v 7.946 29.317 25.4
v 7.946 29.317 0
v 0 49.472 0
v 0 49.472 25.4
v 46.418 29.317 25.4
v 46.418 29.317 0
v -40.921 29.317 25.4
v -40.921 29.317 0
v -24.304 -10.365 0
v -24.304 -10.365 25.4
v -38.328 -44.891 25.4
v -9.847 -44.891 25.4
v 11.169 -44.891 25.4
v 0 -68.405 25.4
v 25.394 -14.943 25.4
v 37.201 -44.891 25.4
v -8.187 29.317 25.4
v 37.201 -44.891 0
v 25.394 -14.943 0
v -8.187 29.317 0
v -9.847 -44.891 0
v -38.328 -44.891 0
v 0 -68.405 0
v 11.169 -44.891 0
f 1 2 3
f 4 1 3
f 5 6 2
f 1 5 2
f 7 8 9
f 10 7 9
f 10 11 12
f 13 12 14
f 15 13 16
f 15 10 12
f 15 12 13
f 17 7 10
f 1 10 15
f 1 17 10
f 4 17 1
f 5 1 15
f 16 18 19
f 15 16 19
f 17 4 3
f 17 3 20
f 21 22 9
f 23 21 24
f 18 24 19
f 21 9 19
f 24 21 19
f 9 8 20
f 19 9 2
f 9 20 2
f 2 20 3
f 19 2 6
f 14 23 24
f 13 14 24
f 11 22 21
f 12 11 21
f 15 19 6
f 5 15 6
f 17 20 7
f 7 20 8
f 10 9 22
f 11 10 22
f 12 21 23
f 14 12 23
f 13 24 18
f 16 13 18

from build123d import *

# Parameters (mm, degrees)
F1_DEPTH = 25.4


with BuildPart() as f1:
    # F0 (on Top) → F1 (new body)
    with BuildSketch(Plane.XY):
        Polygon((-8.186579082, 29.3166413903), (-40.9211441875, 29.3166413903), (-24.3044075905, -10.3651176924), align=None)
        Polygon((0, 49.4718290865), (-8.186579082, 29.3166413903), (7.9457961573, 29.3166413903), align=None)
        Polygon((7.9457961573, 29.3166413903), (-8.186579082, 29.3166413903), (-24.3044075905, -10.3651176924), (-9.8466492379, -44.8911078274), (11.169333611, -44.8911078274), (25.3944805374, -14.9434304482), align=None)
        Polygon((-9.8466492379, -44.8911078274), (-24.3044075905, -10.3651176924), (-38.3280799513, -44.8911078274), align=None)
        Polygon((46.4180149138, 29.3166413903), (7.9457961573, 29.3166413903), (25.3944805374, -14.9434304482), align=None)
        Polygon((11.169333611, -44.8911078274), (-9.8466492379, -44.8911078274), (0, -68.4054940939), align=None)
        Polygon((37.2007779247, -44.8911078274), (25.3944805374, -14.9434304482), (11.169333611, -44.8911078274), align=None)
    extrude(amount=F1_DEPTH)


solid = f1.part
